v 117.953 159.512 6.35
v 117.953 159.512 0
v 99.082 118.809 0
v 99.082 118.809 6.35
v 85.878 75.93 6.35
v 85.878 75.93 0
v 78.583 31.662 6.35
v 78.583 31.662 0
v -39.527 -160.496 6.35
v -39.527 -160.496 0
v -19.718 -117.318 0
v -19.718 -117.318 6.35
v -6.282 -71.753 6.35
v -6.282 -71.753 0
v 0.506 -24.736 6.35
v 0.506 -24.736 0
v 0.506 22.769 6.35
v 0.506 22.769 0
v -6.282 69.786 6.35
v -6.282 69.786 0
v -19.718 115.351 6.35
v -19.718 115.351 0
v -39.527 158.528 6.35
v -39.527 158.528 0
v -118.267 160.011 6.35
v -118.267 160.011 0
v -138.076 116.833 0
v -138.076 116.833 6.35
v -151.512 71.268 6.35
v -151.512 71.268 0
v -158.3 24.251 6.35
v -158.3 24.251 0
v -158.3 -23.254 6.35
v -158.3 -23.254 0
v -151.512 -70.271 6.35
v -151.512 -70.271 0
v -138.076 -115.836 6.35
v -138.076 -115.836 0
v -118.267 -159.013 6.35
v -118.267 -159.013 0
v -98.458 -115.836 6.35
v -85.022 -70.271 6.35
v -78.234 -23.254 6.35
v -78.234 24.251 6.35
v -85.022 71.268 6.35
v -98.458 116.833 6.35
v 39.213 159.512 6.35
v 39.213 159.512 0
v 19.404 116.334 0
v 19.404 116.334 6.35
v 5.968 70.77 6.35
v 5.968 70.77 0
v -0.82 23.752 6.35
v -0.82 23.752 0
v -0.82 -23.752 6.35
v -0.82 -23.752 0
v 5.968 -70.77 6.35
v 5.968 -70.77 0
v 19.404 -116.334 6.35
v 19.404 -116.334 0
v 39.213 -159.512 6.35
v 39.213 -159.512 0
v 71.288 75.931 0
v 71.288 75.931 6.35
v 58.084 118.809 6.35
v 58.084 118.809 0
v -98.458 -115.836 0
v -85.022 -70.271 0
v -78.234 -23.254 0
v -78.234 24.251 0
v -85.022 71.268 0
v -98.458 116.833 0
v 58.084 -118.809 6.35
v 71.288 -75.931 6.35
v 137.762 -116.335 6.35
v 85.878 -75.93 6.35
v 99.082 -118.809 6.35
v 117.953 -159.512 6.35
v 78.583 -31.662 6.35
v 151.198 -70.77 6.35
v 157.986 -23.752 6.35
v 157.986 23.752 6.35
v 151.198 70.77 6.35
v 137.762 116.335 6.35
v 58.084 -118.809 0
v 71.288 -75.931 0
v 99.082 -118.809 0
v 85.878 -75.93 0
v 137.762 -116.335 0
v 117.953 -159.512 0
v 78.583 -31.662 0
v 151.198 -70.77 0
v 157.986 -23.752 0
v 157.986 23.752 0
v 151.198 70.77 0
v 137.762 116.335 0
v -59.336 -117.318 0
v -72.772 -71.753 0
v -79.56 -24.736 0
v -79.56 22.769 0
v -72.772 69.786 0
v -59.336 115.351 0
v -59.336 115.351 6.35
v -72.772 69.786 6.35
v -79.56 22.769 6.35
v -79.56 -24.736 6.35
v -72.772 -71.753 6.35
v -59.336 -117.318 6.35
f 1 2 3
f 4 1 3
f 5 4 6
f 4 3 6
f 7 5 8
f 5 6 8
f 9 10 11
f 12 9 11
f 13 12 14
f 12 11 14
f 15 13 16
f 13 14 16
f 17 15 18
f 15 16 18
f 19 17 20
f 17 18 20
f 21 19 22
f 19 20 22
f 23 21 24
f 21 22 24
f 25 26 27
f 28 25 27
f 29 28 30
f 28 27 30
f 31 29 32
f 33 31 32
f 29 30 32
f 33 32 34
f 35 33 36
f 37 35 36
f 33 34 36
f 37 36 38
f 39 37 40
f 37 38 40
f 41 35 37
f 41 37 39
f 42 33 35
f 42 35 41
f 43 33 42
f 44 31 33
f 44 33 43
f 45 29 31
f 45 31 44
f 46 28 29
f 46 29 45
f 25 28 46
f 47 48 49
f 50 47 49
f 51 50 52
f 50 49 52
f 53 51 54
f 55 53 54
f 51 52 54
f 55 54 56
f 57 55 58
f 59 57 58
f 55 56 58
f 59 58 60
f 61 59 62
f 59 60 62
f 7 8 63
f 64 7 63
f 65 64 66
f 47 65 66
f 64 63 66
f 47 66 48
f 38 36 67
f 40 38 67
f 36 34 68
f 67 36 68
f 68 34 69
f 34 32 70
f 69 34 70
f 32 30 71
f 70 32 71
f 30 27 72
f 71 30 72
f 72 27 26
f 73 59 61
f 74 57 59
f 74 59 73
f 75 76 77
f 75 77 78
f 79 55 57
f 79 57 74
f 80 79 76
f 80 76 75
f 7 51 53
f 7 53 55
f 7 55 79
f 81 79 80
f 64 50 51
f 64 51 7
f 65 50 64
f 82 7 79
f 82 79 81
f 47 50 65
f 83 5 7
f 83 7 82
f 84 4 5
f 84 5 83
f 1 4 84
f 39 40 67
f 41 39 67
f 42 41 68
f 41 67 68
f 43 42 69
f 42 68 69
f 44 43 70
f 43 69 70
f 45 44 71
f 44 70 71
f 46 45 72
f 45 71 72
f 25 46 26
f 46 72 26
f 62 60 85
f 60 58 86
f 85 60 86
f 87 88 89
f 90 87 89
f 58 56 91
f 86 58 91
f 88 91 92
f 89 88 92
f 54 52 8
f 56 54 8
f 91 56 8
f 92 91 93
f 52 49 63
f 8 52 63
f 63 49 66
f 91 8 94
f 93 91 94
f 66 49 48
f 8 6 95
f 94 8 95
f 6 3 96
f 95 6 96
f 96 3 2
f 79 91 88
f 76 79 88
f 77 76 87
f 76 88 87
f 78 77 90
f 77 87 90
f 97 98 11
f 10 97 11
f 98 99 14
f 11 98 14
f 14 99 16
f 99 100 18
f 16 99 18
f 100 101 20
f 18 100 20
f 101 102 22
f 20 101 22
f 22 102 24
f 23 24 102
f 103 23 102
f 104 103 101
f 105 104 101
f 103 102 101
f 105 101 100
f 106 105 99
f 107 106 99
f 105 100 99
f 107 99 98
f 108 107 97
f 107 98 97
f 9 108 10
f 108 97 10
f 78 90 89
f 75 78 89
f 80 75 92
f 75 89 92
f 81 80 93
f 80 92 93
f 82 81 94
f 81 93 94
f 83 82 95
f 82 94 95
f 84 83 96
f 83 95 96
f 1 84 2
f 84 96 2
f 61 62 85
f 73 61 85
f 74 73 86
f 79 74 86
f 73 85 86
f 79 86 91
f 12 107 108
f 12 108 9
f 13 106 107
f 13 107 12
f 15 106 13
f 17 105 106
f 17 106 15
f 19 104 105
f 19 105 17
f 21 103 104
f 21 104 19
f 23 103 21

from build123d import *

# Parameters (mm, degrees)
F3_DEPTH = 6.35


with BuildPart() as f3:
    # F1 (on Top) → F3 (new body)
    with BuildSketch(Plane.XY):
        with BuildLine():
            ThreePointArc((-39.5274765587, -160.4956500232), (1.3581742908, -0.9836500232), (-39.5274765587, 158.5283499768))
            Line((-39.5274765587, 158.5283499768), (-39.5274765587, -160.4956500232))
        make_face()
        with BuildLine():
            Line((-39.5274765587, -160.4956500232), (-39.5274765587, 158.5283499768))
            ThreePointArc((-39.5274765587, 158.5283499768), (-80.4119241846, -0.9836500232), (-39.5274765587, -160.4956500232))
        make_face()
    extrude(amount=F3_DEPTH)


with BuildPart() as f3b:
    # F2 (on Top) → F3, piece 2 (new body)
    with BuildSketch(Plane.XY):
        with BuildLine():
            ThreePointArc((78.5831054185, 31.6624580086), (65.4118171523, 97.5931812681), (39.2125234413, 159.512))
            Line((39.2125234413, 159.512), (39.2125234413, -159.512))
            ThreePointArc((39.2125234413, -159.512), (65.4118171523, -97.5931812681), (78.5831054185, -31.6624580086))
            ThreePointArc((78.5831054185, -31.6624580086), (77.0680758154, 0), (78.5831054185, 31.6624580086))
        make_face()
        with BuildLine():
            Line((39.2125234413, -159.512), (39.2125234413, 159.512))
            ThreePointArc((39.2125234413, 159.512), (-1.6719241846, 0), (39.2125234413, -159.512))
        make_face()
        with BuildLine():
            ThreePointArc((117.9525234413, 159.512), (91.7540003297, 97.5930638805), (78.5831054185, 31.6624580086))
            ThreePointArc((78.5831054185, 31.6624580086), (80.0981742908, 0), (78.5831054185, -31.6624580086))
            ThreePointArc((78.5831054185, -31.6624580086), (91.7540003297, -97.5930638805), (117.9525234413, -159.512))
            Line((117.9525234413, -159.512), (117.9525234413, 159.512))
        make_face()
        with BuildLine():
            ThreePointArc((78.5831054185, -31.6624580086), (80.0981742908, 0), (78.5831054185, 31.6624580086))
            ThreePointArc((78.5831054185, 31.6624580086), (77.0680758154, 0), (78.5831054185, -31.6624580086))
        make_face()
        with BuildLine():
            ThreePointArc((117.9525234413, -159.512), (158.8381742908, 0), (117.9525234413, 159.512))
            Line((117.9525234413, 159.512), (117.9525234413, -159.512))
        make_face()
    extrude(amount=F3_DEPTH)


with BuildPart() as f3c:
    # F0 (on Top) → F3, piece 3 (new body)
    with BuildSketch(Plane.XY):
        with BuildLine():
            ThreePointArc((-118.2674765587, -159.0134054422), (-77.3818257092, 0.4985945578), (-118.2674765587, 160.0105945578))
            Line((-118.2674765587, 160.0105945578), (-118.2674765587, -159.0134054422))
        make_face()
        with BuildLine():
            Line((-118.2674765587, -159.0134054422), (-118.2674765587, 160.0105945578))
            ThreePointArc((-118.2674765587, 160.0105945578), (-159.1519241846, 0.4985945578), (-118.2674765587, -159.0134054422))
        make_face()
    extrude(amount=F3_DEPTH)


solid = Compound([f3.part, f3b.part, f3c.part])
